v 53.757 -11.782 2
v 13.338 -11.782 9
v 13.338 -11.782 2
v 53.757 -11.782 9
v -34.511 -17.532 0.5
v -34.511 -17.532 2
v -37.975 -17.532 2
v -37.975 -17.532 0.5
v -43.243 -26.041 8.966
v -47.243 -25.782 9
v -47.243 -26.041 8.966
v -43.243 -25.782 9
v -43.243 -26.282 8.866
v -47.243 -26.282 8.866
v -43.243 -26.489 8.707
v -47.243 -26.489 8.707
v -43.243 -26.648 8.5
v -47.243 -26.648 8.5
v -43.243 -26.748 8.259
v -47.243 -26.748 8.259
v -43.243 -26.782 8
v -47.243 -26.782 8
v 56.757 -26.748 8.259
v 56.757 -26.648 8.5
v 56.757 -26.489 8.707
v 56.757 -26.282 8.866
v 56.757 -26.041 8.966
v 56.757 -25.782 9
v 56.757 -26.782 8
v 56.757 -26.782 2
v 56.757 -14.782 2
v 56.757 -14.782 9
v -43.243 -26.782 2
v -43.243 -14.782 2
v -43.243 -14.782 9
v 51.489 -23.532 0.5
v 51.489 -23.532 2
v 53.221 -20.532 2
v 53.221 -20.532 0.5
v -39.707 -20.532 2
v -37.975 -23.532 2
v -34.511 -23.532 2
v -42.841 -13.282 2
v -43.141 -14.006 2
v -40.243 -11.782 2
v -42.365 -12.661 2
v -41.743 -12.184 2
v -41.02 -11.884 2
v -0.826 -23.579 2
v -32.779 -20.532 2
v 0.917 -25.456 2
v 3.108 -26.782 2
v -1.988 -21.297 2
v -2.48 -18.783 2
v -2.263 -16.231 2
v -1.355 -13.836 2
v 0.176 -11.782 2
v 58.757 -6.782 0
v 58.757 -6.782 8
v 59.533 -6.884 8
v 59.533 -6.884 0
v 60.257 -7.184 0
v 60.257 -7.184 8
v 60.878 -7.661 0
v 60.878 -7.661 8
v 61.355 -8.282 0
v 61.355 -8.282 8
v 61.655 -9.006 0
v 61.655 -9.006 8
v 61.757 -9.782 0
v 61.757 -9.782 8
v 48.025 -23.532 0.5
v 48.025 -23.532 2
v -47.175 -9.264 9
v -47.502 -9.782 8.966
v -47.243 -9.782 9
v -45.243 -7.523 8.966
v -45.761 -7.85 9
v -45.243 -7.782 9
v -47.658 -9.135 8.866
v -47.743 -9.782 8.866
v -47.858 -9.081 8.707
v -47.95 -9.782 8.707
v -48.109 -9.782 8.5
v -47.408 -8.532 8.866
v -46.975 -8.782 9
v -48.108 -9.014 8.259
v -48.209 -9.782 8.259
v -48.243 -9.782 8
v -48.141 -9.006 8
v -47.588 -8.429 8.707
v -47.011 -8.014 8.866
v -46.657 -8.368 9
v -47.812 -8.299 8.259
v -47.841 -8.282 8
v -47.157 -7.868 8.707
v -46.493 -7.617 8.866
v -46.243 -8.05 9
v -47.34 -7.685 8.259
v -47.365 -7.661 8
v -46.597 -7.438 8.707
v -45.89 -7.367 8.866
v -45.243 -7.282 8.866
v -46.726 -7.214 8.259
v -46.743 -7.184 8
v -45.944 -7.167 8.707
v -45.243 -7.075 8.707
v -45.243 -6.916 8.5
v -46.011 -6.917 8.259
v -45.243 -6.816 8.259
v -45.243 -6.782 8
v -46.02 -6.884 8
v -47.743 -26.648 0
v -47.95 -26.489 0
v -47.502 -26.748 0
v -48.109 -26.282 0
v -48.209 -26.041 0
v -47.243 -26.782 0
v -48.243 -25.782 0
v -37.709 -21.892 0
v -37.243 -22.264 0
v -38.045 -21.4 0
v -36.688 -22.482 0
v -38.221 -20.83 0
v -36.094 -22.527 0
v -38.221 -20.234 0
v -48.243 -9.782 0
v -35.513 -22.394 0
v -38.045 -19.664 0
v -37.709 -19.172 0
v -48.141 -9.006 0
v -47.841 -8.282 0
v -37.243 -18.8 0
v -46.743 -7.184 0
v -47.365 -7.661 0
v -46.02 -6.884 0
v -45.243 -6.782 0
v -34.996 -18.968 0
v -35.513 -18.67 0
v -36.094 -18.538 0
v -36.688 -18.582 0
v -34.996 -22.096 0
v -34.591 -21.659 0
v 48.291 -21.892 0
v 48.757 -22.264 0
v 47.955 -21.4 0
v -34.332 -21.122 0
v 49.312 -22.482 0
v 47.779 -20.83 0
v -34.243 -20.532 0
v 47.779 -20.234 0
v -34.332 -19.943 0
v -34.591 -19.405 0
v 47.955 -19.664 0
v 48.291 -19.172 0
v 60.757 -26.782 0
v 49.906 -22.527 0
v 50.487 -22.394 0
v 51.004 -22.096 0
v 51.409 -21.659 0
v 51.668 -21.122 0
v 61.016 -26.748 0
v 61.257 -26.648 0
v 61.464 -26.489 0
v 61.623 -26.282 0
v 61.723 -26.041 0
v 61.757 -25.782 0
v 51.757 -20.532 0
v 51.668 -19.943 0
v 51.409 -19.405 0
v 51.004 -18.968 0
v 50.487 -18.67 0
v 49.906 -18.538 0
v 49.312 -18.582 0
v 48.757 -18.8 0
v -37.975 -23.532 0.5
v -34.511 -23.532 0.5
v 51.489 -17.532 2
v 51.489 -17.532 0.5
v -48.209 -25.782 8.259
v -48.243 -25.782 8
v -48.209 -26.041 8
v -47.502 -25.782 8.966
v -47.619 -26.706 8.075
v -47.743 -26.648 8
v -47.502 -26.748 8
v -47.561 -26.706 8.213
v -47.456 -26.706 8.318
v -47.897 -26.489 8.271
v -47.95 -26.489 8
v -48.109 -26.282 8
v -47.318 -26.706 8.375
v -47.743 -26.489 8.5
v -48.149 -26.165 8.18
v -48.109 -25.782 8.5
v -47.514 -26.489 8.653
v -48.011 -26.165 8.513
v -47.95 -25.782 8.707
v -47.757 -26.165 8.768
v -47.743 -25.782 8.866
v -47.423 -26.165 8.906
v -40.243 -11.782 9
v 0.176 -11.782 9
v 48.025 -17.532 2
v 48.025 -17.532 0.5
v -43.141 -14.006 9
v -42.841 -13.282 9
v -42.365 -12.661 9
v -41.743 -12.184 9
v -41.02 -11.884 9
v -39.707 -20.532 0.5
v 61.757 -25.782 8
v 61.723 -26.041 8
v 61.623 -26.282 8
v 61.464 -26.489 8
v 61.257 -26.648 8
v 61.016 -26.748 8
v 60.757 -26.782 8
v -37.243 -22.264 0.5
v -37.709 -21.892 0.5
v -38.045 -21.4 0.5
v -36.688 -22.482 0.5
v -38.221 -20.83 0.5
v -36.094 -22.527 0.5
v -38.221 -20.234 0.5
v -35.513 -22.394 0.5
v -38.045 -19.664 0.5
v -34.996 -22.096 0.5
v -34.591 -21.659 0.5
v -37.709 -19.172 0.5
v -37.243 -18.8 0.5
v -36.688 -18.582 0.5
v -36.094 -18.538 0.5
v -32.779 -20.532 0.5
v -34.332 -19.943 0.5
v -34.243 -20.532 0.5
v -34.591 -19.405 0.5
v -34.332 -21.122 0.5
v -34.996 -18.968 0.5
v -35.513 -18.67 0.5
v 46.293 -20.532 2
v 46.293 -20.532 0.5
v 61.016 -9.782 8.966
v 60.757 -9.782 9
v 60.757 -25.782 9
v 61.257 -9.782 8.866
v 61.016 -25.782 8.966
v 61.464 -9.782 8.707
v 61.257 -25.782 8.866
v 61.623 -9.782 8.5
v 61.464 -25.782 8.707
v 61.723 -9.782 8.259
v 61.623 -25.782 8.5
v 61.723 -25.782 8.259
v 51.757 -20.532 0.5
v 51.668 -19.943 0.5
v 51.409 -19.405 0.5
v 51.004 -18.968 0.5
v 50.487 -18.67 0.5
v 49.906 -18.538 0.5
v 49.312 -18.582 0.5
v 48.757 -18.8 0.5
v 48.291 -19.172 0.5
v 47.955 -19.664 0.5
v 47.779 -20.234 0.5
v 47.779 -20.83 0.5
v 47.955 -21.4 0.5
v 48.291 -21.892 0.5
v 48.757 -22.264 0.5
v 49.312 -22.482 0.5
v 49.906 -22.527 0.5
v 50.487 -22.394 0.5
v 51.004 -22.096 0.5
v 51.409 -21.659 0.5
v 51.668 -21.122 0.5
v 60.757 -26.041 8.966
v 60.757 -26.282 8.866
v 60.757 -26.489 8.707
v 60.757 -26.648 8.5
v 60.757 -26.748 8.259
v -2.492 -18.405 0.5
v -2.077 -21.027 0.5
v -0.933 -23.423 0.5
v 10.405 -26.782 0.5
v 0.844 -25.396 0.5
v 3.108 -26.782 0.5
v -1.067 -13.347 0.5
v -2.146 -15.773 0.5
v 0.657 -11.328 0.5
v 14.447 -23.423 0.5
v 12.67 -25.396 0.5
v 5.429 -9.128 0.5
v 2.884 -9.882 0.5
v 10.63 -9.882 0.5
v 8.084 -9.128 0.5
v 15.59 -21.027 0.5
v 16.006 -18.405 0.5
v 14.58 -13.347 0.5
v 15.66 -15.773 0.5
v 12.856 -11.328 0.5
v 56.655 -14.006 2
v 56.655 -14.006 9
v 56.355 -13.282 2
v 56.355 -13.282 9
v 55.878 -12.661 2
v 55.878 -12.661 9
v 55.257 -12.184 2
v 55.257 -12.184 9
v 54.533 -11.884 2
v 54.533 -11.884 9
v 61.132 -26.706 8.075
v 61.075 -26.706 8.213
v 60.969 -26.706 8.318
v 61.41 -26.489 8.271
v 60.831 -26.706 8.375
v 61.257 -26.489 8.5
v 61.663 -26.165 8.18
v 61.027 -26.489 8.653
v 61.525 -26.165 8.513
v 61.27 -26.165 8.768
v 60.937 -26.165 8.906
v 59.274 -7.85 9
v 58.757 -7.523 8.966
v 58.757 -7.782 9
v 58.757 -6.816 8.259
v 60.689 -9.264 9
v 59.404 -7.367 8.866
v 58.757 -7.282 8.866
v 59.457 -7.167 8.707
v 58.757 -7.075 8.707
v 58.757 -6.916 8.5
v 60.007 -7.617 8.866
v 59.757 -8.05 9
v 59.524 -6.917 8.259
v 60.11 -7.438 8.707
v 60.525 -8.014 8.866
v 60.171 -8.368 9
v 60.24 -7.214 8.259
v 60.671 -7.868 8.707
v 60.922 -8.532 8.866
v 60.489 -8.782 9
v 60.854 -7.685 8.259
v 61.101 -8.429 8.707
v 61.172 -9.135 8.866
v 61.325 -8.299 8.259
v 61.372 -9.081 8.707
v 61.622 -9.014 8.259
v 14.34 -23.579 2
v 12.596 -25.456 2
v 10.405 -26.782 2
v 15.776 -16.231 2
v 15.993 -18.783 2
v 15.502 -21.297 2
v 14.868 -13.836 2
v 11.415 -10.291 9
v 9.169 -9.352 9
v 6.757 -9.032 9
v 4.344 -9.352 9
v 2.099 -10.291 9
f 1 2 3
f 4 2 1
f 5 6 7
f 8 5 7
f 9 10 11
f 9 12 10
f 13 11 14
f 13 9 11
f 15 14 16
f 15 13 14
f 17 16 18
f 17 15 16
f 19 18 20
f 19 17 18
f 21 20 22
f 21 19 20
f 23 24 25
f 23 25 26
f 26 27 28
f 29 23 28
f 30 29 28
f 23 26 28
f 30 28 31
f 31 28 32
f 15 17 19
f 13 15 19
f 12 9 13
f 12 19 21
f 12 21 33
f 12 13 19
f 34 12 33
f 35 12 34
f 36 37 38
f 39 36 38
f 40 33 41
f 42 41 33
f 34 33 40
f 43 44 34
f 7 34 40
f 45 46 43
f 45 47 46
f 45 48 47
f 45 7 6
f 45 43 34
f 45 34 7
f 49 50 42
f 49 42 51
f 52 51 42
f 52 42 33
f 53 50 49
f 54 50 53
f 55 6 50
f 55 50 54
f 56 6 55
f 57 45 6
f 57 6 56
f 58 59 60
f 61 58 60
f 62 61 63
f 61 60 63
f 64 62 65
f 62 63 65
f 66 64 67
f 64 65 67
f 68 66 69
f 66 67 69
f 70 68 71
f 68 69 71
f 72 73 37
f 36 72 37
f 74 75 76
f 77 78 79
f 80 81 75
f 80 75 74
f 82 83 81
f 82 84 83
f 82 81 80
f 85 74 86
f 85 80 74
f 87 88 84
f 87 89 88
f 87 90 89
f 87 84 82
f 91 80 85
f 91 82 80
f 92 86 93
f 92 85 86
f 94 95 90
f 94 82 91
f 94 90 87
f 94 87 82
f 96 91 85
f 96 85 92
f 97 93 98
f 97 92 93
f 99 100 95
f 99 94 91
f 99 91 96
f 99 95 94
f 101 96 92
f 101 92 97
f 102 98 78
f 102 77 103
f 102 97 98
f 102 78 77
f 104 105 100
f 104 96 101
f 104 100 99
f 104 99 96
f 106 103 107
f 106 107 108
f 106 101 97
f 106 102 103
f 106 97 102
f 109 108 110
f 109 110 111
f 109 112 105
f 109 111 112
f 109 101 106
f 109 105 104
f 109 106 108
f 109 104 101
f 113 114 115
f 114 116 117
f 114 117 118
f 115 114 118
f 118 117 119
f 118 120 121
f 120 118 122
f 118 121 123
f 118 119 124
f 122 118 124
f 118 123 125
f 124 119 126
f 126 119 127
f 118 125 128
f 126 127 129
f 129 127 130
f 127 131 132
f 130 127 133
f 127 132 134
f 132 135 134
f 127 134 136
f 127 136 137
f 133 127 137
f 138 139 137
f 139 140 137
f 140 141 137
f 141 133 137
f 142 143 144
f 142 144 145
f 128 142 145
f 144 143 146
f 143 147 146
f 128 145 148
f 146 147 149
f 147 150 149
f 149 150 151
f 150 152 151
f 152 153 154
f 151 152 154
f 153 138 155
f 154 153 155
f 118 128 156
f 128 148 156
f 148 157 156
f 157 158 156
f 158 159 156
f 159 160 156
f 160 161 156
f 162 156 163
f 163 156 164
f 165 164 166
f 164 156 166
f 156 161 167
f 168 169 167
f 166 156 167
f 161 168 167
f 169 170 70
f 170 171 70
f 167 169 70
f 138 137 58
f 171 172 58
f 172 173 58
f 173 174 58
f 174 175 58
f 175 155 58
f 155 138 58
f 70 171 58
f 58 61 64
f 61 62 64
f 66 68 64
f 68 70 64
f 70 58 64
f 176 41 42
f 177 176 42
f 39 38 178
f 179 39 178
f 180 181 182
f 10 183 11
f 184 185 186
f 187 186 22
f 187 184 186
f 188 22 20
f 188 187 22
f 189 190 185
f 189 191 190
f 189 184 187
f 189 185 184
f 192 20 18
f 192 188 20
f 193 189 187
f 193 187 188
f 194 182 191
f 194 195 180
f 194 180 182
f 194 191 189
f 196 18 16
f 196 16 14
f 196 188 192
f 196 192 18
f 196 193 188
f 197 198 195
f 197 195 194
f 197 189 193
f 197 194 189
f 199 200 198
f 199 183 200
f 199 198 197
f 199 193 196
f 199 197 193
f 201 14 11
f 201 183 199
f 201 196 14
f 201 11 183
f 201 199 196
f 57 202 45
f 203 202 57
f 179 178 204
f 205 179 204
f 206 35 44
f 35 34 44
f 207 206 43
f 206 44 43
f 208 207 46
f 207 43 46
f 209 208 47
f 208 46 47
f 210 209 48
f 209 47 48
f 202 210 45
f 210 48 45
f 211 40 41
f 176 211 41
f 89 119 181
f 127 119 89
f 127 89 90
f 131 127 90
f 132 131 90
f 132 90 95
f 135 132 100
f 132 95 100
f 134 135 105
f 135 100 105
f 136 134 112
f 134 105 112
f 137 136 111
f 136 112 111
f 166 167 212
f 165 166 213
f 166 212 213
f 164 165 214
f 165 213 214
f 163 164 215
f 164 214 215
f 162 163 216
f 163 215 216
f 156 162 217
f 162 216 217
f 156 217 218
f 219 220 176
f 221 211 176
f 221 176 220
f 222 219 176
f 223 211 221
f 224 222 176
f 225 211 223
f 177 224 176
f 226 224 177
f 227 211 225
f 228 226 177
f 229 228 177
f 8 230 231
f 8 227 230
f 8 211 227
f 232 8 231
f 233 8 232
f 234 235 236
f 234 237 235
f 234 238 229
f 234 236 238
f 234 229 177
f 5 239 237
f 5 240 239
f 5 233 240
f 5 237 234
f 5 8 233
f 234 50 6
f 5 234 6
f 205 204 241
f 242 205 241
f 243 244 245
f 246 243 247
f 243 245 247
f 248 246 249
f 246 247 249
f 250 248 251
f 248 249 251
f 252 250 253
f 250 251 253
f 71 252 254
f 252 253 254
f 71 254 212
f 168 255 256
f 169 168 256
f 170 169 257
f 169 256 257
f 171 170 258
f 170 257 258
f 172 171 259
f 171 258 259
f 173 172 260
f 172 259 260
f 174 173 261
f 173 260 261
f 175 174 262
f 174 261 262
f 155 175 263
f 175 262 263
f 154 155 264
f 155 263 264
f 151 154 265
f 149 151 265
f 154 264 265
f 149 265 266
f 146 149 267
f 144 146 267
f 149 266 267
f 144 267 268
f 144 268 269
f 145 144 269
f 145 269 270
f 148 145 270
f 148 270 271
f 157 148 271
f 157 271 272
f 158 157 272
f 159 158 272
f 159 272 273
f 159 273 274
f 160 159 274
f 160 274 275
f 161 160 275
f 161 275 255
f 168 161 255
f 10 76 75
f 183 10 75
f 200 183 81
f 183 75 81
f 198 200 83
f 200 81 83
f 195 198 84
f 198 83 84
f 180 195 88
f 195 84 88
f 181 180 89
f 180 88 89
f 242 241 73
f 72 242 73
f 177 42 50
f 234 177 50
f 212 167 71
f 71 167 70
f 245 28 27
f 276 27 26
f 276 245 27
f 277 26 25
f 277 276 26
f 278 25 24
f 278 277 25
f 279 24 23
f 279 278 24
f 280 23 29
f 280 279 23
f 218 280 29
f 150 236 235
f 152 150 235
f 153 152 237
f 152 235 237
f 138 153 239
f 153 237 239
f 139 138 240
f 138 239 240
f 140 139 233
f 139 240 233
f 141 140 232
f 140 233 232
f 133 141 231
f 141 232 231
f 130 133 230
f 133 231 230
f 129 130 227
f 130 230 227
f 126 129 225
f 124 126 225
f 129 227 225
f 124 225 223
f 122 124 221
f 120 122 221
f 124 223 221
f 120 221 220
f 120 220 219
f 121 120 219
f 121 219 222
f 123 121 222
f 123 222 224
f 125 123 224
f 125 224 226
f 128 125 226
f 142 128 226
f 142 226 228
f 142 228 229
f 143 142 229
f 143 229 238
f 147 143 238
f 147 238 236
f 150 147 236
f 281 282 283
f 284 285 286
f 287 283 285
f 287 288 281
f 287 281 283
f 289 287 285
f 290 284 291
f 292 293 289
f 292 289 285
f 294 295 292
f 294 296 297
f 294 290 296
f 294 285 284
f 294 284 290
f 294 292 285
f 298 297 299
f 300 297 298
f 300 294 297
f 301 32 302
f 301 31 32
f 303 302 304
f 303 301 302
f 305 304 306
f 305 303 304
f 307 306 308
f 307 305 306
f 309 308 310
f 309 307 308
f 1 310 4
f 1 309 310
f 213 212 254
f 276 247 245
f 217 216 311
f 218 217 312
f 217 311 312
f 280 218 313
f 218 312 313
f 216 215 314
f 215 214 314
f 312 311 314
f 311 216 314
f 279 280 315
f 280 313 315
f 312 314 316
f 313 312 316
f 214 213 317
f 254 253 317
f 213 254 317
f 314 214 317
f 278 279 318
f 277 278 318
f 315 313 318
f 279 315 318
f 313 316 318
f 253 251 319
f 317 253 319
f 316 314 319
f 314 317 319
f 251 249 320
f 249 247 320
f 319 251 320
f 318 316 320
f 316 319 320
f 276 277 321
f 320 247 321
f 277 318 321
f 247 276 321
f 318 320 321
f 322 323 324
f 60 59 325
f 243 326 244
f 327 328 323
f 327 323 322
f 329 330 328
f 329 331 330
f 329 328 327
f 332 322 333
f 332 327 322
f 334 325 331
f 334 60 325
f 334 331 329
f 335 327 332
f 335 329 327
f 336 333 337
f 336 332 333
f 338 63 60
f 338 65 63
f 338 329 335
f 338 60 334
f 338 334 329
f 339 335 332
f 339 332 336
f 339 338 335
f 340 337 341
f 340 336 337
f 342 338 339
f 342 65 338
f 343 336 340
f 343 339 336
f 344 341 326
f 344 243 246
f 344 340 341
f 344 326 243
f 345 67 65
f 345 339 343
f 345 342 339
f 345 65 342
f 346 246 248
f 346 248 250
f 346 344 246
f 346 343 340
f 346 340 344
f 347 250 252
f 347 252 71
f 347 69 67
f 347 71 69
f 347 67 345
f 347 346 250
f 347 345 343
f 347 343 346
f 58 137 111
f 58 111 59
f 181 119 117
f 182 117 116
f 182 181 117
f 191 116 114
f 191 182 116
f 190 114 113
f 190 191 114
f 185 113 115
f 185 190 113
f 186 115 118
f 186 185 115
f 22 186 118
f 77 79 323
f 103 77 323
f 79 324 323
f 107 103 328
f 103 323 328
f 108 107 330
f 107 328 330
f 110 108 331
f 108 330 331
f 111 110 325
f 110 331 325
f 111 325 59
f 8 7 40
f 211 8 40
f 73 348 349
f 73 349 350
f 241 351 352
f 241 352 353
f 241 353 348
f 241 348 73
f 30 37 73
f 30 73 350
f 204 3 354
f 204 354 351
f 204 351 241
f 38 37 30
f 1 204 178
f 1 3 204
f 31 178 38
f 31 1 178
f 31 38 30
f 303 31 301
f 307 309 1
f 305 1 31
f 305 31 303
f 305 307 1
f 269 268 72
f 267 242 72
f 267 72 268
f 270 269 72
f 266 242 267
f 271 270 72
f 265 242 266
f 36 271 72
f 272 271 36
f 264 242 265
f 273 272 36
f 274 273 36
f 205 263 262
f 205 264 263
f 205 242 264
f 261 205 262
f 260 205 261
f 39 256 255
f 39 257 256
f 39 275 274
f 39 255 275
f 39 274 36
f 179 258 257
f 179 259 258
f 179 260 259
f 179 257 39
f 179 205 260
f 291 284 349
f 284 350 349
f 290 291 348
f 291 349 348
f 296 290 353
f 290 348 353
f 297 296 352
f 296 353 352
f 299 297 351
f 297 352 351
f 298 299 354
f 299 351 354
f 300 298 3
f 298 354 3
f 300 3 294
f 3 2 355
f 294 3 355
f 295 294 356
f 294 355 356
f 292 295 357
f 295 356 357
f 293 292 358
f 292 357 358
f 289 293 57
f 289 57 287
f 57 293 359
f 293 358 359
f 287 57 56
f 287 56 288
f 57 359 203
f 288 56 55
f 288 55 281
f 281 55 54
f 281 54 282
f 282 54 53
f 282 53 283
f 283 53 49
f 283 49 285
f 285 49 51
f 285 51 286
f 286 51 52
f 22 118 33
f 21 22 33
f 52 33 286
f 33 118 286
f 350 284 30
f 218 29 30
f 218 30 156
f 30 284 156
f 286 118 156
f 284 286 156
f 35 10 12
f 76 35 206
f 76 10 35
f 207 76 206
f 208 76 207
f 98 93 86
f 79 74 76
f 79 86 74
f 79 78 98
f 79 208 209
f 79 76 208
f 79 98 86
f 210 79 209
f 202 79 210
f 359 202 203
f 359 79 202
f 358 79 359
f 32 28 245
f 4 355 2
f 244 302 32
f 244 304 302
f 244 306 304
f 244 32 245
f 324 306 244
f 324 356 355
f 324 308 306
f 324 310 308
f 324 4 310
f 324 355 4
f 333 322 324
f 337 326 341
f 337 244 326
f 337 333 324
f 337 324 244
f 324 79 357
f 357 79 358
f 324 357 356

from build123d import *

# Parameters (mm, degrees)
F0_W           = 110
F0_H           = 20
F1_DEPTH       = 9
F2_W           = 100
F2_H           = 15
F3_DEPTH       = 7
F4_R           = 3
F5_R           = 2
F6_DEPTH       = 20
F8_DEPTH       = 1.5
F9_R           = 9.25
F10_DEPTH      = 1.5
F10_DEPTH_BACK = 7
F11_R          = 1


with BuildPart() as f1:
    # F0 (on Top) → F1 (new body)
    with BuildSketch(Plane.XY):
        with Locations((6.7567551136, -16.7820947109)):
            Rectangle(F0_W, F0_H)
    extrude(amount=F1_DEPTH)

    # F2 (on face) → F3 (cut)
    with BuildSketch(Plane.XY.offset(9)):
        with Locations((6.7567551136, -19.2820947109)):
            Rectangle(F2_W, F2_H)
    extrude(amount=-F3_DEPTH, mode=Mode.SUBTRACT)

    # F4
    f4_edges = [f1.edges().sort_by_distance(p)[0] for p in [
        (-43.243245, -11.782095, 5.5),
        (56.756755, -11.782095, 5.5),
        (-48.243245, -6.782095, 4.5),
        (61.756755, -6.782095, 4.5),
    ]]
    fillet(f4_edges, radius=F4_R)

    # F5 (on face) → F6 (cut)
    with BuildSketch(Plane.XY.offset(2)):
        with Locations((49.7567551136, -20.5320947109)):
            Circle(F5_R)
        with Locations((-36.2432448864, -20.5320947109)):
            Circle(F5_R)
    extrude(amount=-F6_DEPTH, mode=Mode.SUBTRACT)

    # F7 (on face) → F8 (cut)
    with BuildSketch(Plane.XY.offset(2)):
        Polygon((-34.5111940788, -17.5320947109), (-37.975295694, -17.5320947109), (-39.7073465015, -20.5320947109), (-37.975295694, -23.5320947109), (-34.5111940788, -23.5320947109), (-32.7791432713, -20.5320947109), align=None)
        Polygon((53.2208567287, -20.5320947109), (51.4888059212, -17.5320947109), (48.024704306, -17.5320947109), (46.2926534985, -20.5320947109), (48.024704306, -23.5320947109), (51.4888059212, -23.5320947109), align=None)
    extrude(amount=-F8_DEPTH, mode=Mode.SUBTRACT)

    # F9 (on face) → F10 (cut, two sides)
    with BuildSketch(Plane.XY.offset(2)) as f10_sk:
        with Locations((6.7567551136, -18.2820947109)):
            Circle(F9_R)
    extrude(amount=-F10_DEPTH, mode=Mode.SUBTRACT)
    extrude(f10_sk.sketch, amount=F10_DEPTH_BACK, mode=Mode.SUBTRACT)

    # F11
    f11_edges = [f1.edges().sort_by_distance(p)[0] for p in [
        (6.756755, -6.782095, 9),
        (-48.243245, -26.782095, 4.5),
        (61.756755, -26.782095, 4.5),
        (59.256755, -26.782095, 9),
        (-45.743245, -26.782095, 9),
    ]]
    fillet(f11_edges, radius=F11_R)


solid = f1.part
